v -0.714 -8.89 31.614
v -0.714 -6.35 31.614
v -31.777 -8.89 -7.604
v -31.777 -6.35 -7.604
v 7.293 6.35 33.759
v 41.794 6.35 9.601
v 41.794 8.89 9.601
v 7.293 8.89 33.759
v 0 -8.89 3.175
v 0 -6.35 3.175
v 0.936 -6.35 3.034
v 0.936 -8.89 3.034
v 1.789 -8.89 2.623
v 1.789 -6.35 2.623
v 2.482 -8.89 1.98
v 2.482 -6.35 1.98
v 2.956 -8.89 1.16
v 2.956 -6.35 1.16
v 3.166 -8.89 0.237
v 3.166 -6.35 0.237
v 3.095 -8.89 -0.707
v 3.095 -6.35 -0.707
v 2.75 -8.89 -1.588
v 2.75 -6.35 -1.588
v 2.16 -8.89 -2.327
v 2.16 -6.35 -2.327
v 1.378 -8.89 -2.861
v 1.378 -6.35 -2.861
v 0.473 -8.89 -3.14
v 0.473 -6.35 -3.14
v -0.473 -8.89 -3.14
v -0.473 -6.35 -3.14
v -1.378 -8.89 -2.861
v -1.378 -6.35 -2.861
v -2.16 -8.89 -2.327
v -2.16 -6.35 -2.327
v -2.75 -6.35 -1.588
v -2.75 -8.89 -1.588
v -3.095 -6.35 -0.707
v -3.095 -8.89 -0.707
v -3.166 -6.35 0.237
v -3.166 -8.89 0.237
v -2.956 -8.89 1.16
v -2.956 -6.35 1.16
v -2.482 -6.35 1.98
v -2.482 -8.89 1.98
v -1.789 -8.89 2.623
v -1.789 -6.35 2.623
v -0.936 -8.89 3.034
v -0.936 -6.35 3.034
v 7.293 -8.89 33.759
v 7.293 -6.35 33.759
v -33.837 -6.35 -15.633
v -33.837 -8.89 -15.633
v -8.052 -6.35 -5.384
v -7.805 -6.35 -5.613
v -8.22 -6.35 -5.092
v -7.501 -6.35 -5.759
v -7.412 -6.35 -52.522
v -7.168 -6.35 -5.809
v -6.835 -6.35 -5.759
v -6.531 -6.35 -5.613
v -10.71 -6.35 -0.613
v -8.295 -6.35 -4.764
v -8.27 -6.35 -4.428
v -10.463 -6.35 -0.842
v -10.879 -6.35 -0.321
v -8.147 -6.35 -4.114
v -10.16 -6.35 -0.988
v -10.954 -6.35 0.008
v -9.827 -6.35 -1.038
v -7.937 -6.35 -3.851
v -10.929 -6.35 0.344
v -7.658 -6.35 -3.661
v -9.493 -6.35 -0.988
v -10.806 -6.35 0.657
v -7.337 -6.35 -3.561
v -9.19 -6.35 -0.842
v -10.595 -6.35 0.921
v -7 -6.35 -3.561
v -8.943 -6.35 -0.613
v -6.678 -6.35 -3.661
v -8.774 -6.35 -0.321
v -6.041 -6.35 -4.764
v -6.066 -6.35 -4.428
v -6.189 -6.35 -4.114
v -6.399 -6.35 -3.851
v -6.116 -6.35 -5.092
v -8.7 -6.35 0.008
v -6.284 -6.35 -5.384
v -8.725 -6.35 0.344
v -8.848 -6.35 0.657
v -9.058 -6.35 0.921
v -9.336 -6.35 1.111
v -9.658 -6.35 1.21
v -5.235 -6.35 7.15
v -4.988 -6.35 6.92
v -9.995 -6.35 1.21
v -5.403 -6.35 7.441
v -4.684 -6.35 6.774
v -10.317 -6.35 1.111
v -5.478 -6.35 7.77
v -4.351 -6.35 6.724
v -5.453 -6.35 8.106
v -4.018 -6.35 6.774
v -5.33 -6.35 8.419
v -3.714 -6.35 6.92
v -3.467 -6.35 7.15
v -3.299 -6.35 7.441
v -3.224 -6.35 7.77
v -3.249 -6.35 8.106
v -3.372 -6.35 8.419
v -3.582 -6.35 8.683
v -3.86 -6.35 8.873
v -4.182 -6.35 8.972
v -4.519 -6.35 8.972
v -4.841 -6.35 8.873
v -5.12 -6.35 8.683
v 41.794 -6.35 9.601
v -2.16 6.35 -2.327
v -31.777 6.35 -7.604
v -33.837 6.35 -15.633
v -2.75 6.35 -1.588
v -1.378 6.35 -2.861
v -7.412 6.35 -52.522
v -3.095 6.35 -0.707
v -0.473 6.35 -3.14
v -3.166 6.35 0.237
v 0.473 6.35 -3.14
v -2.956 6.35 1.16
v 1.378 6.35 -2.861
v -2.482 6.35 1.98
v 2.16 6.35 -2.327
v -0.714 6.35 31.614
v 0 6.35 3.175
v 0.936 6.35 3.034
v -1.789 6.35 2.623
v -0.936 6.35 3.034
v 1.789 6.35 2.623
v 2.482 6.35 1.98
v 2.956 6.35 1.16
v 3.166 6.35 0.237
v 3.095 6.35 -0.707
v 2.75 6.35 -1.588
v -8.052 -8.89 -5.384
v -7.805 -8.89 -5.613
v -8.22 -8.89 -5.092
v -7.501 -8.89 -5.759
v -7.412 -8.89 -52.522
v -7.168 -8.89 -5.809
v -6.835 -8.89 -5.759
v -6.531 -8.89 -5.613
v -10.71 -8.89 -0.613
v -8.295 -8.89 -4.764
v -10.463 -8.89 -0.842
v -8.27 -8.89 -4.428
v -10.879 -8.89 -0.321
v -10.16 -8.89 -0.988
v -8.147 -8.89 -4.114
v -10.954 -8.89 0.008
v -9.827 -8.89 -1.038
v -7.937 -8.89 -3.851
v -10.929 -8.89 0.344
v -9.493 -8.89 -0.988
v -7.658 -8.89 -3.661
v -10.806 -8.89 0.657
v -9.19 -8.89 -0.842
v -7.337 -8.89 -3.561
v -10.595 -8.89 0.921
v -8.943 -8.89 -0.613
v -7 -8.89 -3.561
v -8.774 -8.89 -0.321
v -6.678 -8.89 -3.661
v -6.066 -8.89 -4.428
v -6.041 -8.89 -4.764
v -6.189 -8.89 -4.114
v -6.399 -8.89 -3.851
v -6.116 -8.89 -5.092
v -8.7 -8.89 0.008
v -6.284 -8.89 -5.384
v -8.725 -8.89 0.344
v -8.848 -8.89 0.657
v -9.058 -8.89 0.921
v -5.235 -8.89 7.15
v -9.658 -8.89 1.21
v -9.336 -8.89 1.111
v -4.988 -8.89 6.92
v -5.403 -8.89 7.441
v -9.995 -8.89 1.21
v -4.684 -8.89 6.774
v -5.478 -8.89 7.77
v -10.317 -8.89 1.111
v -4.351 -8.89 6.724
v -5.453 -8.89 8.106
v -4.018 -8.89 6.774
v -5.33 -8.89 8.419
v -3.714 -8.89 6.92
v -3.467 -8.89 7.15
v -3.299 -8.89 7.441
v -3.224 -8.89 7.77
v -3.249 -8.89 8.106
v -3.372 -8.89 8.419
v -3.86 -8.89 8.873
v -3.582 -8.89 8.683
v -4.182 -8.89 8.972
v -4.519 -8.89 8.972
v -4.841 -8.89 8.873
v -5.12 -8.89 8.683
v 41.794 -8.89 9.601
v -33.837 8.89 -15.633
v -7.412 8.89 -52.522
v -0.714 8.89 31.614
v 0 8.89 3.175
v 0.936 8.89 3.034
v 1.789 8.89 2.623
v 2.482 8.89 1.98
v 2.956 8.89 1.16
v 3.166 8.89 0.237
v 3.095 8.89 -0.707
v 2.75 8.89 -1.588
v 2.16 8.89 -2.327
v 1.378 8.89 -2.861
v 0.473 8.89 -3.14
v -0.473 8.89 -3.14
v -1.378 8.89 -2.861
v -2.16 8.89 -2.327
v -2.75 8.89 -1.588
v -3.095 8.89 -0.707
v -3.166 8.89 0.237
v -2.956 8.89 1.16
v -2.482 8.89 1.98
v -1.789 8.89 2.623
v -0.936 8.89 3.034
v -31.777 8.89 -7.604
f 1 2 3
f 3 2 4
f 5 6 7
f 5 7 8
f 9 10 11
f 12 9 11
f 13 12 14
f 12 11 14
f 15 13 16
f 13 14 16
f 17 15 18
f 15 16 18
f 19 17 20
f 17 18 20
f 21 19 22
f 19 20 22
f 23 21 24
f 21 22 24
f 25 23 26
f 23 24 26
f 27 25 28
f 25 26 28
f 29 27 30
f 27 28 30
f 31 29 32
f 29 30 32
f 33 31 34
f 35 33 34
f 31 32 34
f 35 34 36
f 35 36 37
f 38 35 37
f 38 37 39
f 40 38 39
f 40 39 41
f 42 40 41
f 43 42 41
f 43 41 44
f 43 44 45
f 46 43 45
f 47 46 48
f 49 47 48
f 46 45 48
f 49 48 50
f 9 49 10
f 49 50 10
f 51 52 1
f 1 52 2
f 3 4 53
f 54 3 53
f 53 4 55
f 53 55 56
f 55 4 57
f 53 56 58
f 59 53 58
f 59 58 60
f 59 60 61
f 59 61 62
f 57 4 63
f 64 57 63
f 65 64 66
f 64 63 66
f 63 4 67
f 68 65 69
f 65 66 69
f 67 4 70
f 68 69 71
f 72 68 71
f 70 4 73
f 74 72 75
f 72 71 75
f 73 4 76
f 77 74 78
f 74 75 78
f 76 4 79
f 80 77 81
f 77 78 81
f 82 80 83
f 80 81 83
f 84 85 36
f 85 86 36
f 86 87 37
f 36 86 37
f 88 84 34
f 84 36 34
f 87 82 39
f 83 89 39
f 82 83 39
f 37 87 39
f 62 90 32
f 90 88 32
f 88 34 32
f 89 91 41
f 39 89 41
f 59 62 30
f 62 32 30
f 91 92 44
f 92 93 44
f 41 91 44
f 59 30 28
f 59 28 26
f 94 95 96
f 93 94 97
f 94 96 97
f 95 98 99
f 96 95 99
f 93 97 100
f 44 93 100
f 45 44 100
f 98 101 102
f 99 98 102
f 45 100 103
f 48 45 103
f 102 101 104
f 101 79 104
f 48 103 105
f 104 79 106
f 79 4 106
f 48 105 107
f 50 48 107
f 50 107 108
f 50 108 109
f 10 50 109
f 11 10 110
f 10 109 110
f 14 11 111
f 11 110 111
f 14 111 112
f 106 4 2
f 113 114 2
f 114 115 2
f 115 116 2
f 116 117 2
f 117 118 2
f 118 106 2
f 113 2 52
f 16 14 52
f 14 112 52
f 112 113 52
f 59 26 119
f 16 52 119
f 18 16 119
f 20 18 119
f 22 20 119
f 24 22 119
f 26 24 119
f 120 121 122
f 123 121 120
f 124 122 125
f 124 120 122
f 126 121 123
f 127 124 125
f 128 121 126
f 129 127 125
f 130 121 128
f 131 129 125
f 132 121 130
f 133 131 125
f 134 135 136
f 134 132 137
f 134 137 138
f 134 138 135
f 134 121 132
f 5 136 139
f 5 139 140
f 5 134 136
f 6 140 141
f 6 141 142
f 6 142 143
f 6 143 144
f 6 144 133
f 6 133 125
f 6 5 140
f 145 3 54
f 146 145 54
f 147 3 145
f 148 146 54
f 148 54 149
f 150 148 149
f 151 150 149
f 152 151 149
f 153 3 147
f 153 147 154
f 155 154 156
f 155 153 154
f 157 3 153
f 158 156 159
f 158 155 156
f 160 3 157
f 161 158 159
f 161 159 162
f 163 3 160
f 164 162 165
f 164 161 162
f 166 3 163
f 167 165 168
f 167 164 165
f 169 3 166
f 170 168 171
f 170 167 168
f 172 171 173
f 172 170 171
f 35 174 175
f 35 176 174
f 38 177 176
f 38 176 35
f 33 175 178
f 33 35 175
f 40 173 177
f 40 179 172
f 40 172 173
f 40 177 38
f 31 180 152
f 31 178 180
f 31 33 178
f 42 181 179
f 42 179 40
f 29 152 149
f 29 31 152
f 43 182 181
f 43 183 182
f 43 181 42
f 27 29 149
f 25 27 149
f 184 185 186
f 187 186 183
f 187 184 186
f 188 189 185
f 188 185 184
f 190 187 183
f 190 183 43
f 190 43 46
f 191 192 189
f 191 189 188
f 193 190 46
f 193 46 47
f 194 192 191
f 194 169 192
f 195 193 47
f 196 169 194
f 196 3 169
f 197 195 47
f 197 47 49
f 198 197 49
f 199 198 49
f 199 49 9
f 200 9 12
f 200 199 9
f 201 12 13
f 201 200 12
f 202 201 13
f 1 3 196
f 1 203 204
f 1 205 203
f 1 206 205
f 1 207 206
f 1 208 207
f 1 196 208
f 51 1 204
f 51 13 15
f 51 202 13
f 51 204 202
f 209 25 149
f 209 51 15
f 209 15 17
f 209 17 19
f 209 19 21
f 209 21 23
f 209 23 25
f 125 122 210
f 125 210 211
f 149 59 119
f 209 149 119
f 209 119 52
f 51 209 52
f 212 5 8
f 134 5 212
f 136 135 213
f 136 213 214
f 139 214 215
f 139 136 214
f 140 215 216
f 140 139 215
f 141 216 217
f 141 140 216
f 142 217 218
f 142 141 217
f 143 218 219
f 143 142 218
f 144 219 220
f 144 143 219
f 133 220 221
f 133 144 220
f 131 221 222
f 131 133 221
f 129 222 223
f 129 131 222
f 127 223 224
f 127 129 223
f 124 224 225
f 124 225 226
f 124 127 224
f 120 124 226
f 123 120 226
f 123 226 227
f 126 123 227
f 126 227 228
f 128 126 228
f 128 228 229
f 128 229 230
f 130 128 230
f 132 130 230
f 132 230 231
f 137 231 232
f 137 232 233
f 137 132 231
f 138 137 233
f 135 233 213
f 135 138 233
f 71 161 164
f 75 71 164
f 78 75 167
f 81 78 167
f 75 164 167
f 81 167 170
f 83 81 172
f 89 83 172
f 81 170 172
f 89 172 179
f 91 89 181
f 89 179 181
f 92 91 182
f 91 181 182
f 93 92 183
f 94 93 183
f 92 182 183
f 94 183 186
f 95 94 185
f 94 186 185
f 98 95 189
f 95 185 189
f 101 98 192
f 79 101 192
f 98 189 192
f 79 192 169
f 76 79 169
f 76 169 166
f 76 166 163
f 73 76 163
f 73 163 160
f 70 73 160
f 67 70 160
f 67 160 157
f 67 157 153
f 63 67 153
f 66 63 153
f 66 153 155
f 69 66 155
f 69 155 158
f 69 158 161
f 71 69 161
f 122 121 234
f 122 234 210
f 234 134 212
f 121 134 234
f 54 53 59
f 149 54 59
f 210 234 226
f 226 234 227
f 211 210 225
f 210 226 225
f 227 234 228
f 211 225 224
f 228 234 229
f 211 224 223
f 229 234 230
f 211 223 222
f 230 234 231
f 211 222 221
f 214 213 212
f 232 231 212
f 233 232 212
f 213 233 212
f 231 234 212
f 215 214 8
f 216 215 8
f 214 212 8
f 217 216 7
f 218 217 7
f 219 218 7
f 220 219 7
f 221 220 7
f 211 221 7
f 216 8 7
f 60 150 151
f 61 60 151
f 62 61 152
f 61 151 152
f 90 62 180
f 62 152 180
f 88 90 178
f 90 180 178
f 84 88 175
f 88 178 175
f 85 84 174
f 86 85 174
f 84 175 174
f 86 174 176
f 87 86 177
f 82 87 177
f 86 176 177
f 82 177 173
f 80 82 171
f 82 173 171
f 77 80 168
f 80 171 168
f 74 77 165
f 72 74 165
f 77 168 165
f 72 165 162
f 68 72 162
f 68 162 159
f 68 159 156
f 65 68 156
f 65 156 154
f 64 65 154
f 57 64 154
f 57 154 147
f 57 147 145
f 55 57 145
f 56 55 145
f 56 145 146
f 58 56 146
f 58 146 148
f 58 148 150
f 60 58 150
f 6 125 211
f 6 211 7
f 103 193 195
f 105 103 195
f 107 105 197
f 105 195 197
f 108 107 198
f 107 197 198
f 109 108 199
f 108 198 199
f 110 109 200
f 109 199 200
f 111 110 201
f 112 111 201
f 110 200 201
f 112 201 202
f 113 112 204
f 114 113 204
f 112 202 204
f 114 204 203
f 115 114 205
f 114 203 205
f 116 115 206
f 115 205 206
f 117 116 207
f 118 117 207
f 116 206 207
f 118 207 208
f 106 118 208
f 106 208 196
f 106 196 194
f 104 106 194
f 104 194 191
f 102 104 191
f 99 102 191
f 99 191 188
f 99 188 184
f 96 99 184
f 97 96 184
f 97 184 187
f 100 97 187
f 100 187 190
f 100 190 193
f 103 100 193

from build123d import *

# Parameters (mm, degrees)
SKETCH2_R           = 3.175
BOSS_EXTRUDE2_DEPTH = 2.54
SKETCH4_R           = 3.175
BOSS_EXTRUDE3_DEPTH = 2.54
SKETCH5_R           = 1.1303
CUT_EXTRUDE1_DEPTH  = 5.08


with BuildPart() as part:
    # Sketch2 → Boss-Extrude2 (new body)
    with BuildSketch(Plane(origin=(0, 6.35, 0), x_dir=(-1, 0, 0), z_dir=(0, 1, 0))):
        Polygon((0.713995358, 31.613572635), (31.777418825, -7.603548367), (33.836779239, -15.633002319), (7.412244786, -52.521880964), (-41.794398071, 9.600791031), (-7.292888746, 33.759010361), align=None)
        with Locations(Location((0, 0, 0), (0, 0, 90))):
            Circle(SKETCH2_R, mode=Mode.SUBTRACT)
    extrude(amount=BOSS_EXTRUDE2_DEPTH)


with BuildPart() as body_2:
    # Sketch4 → Boss-Extrude3 (new body)
    with BuildSketch(Plane(origin=(0, -6.35, 0), x_dir=(-1, 0, 0), z_dir=(0, 1, 0))):
        Polygon((0.713995358, 31.613572635), (31.777418825, -7.603548367), (33.836779239, -15.633002319), (7.412244786, -52.521880964), (-41.794398071, 9.600791031), (-7.292888746, 33.759010361), align=None)
        with Locations(Location((0, 0, 0), (0, 0, 90))):
            Circle(SKETCH4_R, mode=Mode.SUBTRACT)
    extrude(amount=-BOSS_EXTRUDE3_DEPTH)

    # Sketch5 → Cut-Extrude1 (cut)
    with BuildSketch(Plane.XZ.offset(8.89)):
        with Locations(Location((-4.350861658, 7.854263646, 0), (0, 0, 270))):
            Circle(SKETCH5_R)
        with Locations(Location((-9.826647811, 0.092215782, 0), (0, 0, 270))):
            Circle(SKETCH5_R)
        with Locations(Location((-7.168068721, -4.679147899, 0), (0, 0, 270))):
            Circle(SKETCH5_R)
    extrude(amount=-CUT_EXTRUDE1_DEPTH, mode=Mode.SUBTRACT)


solid = Compound([part.part, body_2.part])
